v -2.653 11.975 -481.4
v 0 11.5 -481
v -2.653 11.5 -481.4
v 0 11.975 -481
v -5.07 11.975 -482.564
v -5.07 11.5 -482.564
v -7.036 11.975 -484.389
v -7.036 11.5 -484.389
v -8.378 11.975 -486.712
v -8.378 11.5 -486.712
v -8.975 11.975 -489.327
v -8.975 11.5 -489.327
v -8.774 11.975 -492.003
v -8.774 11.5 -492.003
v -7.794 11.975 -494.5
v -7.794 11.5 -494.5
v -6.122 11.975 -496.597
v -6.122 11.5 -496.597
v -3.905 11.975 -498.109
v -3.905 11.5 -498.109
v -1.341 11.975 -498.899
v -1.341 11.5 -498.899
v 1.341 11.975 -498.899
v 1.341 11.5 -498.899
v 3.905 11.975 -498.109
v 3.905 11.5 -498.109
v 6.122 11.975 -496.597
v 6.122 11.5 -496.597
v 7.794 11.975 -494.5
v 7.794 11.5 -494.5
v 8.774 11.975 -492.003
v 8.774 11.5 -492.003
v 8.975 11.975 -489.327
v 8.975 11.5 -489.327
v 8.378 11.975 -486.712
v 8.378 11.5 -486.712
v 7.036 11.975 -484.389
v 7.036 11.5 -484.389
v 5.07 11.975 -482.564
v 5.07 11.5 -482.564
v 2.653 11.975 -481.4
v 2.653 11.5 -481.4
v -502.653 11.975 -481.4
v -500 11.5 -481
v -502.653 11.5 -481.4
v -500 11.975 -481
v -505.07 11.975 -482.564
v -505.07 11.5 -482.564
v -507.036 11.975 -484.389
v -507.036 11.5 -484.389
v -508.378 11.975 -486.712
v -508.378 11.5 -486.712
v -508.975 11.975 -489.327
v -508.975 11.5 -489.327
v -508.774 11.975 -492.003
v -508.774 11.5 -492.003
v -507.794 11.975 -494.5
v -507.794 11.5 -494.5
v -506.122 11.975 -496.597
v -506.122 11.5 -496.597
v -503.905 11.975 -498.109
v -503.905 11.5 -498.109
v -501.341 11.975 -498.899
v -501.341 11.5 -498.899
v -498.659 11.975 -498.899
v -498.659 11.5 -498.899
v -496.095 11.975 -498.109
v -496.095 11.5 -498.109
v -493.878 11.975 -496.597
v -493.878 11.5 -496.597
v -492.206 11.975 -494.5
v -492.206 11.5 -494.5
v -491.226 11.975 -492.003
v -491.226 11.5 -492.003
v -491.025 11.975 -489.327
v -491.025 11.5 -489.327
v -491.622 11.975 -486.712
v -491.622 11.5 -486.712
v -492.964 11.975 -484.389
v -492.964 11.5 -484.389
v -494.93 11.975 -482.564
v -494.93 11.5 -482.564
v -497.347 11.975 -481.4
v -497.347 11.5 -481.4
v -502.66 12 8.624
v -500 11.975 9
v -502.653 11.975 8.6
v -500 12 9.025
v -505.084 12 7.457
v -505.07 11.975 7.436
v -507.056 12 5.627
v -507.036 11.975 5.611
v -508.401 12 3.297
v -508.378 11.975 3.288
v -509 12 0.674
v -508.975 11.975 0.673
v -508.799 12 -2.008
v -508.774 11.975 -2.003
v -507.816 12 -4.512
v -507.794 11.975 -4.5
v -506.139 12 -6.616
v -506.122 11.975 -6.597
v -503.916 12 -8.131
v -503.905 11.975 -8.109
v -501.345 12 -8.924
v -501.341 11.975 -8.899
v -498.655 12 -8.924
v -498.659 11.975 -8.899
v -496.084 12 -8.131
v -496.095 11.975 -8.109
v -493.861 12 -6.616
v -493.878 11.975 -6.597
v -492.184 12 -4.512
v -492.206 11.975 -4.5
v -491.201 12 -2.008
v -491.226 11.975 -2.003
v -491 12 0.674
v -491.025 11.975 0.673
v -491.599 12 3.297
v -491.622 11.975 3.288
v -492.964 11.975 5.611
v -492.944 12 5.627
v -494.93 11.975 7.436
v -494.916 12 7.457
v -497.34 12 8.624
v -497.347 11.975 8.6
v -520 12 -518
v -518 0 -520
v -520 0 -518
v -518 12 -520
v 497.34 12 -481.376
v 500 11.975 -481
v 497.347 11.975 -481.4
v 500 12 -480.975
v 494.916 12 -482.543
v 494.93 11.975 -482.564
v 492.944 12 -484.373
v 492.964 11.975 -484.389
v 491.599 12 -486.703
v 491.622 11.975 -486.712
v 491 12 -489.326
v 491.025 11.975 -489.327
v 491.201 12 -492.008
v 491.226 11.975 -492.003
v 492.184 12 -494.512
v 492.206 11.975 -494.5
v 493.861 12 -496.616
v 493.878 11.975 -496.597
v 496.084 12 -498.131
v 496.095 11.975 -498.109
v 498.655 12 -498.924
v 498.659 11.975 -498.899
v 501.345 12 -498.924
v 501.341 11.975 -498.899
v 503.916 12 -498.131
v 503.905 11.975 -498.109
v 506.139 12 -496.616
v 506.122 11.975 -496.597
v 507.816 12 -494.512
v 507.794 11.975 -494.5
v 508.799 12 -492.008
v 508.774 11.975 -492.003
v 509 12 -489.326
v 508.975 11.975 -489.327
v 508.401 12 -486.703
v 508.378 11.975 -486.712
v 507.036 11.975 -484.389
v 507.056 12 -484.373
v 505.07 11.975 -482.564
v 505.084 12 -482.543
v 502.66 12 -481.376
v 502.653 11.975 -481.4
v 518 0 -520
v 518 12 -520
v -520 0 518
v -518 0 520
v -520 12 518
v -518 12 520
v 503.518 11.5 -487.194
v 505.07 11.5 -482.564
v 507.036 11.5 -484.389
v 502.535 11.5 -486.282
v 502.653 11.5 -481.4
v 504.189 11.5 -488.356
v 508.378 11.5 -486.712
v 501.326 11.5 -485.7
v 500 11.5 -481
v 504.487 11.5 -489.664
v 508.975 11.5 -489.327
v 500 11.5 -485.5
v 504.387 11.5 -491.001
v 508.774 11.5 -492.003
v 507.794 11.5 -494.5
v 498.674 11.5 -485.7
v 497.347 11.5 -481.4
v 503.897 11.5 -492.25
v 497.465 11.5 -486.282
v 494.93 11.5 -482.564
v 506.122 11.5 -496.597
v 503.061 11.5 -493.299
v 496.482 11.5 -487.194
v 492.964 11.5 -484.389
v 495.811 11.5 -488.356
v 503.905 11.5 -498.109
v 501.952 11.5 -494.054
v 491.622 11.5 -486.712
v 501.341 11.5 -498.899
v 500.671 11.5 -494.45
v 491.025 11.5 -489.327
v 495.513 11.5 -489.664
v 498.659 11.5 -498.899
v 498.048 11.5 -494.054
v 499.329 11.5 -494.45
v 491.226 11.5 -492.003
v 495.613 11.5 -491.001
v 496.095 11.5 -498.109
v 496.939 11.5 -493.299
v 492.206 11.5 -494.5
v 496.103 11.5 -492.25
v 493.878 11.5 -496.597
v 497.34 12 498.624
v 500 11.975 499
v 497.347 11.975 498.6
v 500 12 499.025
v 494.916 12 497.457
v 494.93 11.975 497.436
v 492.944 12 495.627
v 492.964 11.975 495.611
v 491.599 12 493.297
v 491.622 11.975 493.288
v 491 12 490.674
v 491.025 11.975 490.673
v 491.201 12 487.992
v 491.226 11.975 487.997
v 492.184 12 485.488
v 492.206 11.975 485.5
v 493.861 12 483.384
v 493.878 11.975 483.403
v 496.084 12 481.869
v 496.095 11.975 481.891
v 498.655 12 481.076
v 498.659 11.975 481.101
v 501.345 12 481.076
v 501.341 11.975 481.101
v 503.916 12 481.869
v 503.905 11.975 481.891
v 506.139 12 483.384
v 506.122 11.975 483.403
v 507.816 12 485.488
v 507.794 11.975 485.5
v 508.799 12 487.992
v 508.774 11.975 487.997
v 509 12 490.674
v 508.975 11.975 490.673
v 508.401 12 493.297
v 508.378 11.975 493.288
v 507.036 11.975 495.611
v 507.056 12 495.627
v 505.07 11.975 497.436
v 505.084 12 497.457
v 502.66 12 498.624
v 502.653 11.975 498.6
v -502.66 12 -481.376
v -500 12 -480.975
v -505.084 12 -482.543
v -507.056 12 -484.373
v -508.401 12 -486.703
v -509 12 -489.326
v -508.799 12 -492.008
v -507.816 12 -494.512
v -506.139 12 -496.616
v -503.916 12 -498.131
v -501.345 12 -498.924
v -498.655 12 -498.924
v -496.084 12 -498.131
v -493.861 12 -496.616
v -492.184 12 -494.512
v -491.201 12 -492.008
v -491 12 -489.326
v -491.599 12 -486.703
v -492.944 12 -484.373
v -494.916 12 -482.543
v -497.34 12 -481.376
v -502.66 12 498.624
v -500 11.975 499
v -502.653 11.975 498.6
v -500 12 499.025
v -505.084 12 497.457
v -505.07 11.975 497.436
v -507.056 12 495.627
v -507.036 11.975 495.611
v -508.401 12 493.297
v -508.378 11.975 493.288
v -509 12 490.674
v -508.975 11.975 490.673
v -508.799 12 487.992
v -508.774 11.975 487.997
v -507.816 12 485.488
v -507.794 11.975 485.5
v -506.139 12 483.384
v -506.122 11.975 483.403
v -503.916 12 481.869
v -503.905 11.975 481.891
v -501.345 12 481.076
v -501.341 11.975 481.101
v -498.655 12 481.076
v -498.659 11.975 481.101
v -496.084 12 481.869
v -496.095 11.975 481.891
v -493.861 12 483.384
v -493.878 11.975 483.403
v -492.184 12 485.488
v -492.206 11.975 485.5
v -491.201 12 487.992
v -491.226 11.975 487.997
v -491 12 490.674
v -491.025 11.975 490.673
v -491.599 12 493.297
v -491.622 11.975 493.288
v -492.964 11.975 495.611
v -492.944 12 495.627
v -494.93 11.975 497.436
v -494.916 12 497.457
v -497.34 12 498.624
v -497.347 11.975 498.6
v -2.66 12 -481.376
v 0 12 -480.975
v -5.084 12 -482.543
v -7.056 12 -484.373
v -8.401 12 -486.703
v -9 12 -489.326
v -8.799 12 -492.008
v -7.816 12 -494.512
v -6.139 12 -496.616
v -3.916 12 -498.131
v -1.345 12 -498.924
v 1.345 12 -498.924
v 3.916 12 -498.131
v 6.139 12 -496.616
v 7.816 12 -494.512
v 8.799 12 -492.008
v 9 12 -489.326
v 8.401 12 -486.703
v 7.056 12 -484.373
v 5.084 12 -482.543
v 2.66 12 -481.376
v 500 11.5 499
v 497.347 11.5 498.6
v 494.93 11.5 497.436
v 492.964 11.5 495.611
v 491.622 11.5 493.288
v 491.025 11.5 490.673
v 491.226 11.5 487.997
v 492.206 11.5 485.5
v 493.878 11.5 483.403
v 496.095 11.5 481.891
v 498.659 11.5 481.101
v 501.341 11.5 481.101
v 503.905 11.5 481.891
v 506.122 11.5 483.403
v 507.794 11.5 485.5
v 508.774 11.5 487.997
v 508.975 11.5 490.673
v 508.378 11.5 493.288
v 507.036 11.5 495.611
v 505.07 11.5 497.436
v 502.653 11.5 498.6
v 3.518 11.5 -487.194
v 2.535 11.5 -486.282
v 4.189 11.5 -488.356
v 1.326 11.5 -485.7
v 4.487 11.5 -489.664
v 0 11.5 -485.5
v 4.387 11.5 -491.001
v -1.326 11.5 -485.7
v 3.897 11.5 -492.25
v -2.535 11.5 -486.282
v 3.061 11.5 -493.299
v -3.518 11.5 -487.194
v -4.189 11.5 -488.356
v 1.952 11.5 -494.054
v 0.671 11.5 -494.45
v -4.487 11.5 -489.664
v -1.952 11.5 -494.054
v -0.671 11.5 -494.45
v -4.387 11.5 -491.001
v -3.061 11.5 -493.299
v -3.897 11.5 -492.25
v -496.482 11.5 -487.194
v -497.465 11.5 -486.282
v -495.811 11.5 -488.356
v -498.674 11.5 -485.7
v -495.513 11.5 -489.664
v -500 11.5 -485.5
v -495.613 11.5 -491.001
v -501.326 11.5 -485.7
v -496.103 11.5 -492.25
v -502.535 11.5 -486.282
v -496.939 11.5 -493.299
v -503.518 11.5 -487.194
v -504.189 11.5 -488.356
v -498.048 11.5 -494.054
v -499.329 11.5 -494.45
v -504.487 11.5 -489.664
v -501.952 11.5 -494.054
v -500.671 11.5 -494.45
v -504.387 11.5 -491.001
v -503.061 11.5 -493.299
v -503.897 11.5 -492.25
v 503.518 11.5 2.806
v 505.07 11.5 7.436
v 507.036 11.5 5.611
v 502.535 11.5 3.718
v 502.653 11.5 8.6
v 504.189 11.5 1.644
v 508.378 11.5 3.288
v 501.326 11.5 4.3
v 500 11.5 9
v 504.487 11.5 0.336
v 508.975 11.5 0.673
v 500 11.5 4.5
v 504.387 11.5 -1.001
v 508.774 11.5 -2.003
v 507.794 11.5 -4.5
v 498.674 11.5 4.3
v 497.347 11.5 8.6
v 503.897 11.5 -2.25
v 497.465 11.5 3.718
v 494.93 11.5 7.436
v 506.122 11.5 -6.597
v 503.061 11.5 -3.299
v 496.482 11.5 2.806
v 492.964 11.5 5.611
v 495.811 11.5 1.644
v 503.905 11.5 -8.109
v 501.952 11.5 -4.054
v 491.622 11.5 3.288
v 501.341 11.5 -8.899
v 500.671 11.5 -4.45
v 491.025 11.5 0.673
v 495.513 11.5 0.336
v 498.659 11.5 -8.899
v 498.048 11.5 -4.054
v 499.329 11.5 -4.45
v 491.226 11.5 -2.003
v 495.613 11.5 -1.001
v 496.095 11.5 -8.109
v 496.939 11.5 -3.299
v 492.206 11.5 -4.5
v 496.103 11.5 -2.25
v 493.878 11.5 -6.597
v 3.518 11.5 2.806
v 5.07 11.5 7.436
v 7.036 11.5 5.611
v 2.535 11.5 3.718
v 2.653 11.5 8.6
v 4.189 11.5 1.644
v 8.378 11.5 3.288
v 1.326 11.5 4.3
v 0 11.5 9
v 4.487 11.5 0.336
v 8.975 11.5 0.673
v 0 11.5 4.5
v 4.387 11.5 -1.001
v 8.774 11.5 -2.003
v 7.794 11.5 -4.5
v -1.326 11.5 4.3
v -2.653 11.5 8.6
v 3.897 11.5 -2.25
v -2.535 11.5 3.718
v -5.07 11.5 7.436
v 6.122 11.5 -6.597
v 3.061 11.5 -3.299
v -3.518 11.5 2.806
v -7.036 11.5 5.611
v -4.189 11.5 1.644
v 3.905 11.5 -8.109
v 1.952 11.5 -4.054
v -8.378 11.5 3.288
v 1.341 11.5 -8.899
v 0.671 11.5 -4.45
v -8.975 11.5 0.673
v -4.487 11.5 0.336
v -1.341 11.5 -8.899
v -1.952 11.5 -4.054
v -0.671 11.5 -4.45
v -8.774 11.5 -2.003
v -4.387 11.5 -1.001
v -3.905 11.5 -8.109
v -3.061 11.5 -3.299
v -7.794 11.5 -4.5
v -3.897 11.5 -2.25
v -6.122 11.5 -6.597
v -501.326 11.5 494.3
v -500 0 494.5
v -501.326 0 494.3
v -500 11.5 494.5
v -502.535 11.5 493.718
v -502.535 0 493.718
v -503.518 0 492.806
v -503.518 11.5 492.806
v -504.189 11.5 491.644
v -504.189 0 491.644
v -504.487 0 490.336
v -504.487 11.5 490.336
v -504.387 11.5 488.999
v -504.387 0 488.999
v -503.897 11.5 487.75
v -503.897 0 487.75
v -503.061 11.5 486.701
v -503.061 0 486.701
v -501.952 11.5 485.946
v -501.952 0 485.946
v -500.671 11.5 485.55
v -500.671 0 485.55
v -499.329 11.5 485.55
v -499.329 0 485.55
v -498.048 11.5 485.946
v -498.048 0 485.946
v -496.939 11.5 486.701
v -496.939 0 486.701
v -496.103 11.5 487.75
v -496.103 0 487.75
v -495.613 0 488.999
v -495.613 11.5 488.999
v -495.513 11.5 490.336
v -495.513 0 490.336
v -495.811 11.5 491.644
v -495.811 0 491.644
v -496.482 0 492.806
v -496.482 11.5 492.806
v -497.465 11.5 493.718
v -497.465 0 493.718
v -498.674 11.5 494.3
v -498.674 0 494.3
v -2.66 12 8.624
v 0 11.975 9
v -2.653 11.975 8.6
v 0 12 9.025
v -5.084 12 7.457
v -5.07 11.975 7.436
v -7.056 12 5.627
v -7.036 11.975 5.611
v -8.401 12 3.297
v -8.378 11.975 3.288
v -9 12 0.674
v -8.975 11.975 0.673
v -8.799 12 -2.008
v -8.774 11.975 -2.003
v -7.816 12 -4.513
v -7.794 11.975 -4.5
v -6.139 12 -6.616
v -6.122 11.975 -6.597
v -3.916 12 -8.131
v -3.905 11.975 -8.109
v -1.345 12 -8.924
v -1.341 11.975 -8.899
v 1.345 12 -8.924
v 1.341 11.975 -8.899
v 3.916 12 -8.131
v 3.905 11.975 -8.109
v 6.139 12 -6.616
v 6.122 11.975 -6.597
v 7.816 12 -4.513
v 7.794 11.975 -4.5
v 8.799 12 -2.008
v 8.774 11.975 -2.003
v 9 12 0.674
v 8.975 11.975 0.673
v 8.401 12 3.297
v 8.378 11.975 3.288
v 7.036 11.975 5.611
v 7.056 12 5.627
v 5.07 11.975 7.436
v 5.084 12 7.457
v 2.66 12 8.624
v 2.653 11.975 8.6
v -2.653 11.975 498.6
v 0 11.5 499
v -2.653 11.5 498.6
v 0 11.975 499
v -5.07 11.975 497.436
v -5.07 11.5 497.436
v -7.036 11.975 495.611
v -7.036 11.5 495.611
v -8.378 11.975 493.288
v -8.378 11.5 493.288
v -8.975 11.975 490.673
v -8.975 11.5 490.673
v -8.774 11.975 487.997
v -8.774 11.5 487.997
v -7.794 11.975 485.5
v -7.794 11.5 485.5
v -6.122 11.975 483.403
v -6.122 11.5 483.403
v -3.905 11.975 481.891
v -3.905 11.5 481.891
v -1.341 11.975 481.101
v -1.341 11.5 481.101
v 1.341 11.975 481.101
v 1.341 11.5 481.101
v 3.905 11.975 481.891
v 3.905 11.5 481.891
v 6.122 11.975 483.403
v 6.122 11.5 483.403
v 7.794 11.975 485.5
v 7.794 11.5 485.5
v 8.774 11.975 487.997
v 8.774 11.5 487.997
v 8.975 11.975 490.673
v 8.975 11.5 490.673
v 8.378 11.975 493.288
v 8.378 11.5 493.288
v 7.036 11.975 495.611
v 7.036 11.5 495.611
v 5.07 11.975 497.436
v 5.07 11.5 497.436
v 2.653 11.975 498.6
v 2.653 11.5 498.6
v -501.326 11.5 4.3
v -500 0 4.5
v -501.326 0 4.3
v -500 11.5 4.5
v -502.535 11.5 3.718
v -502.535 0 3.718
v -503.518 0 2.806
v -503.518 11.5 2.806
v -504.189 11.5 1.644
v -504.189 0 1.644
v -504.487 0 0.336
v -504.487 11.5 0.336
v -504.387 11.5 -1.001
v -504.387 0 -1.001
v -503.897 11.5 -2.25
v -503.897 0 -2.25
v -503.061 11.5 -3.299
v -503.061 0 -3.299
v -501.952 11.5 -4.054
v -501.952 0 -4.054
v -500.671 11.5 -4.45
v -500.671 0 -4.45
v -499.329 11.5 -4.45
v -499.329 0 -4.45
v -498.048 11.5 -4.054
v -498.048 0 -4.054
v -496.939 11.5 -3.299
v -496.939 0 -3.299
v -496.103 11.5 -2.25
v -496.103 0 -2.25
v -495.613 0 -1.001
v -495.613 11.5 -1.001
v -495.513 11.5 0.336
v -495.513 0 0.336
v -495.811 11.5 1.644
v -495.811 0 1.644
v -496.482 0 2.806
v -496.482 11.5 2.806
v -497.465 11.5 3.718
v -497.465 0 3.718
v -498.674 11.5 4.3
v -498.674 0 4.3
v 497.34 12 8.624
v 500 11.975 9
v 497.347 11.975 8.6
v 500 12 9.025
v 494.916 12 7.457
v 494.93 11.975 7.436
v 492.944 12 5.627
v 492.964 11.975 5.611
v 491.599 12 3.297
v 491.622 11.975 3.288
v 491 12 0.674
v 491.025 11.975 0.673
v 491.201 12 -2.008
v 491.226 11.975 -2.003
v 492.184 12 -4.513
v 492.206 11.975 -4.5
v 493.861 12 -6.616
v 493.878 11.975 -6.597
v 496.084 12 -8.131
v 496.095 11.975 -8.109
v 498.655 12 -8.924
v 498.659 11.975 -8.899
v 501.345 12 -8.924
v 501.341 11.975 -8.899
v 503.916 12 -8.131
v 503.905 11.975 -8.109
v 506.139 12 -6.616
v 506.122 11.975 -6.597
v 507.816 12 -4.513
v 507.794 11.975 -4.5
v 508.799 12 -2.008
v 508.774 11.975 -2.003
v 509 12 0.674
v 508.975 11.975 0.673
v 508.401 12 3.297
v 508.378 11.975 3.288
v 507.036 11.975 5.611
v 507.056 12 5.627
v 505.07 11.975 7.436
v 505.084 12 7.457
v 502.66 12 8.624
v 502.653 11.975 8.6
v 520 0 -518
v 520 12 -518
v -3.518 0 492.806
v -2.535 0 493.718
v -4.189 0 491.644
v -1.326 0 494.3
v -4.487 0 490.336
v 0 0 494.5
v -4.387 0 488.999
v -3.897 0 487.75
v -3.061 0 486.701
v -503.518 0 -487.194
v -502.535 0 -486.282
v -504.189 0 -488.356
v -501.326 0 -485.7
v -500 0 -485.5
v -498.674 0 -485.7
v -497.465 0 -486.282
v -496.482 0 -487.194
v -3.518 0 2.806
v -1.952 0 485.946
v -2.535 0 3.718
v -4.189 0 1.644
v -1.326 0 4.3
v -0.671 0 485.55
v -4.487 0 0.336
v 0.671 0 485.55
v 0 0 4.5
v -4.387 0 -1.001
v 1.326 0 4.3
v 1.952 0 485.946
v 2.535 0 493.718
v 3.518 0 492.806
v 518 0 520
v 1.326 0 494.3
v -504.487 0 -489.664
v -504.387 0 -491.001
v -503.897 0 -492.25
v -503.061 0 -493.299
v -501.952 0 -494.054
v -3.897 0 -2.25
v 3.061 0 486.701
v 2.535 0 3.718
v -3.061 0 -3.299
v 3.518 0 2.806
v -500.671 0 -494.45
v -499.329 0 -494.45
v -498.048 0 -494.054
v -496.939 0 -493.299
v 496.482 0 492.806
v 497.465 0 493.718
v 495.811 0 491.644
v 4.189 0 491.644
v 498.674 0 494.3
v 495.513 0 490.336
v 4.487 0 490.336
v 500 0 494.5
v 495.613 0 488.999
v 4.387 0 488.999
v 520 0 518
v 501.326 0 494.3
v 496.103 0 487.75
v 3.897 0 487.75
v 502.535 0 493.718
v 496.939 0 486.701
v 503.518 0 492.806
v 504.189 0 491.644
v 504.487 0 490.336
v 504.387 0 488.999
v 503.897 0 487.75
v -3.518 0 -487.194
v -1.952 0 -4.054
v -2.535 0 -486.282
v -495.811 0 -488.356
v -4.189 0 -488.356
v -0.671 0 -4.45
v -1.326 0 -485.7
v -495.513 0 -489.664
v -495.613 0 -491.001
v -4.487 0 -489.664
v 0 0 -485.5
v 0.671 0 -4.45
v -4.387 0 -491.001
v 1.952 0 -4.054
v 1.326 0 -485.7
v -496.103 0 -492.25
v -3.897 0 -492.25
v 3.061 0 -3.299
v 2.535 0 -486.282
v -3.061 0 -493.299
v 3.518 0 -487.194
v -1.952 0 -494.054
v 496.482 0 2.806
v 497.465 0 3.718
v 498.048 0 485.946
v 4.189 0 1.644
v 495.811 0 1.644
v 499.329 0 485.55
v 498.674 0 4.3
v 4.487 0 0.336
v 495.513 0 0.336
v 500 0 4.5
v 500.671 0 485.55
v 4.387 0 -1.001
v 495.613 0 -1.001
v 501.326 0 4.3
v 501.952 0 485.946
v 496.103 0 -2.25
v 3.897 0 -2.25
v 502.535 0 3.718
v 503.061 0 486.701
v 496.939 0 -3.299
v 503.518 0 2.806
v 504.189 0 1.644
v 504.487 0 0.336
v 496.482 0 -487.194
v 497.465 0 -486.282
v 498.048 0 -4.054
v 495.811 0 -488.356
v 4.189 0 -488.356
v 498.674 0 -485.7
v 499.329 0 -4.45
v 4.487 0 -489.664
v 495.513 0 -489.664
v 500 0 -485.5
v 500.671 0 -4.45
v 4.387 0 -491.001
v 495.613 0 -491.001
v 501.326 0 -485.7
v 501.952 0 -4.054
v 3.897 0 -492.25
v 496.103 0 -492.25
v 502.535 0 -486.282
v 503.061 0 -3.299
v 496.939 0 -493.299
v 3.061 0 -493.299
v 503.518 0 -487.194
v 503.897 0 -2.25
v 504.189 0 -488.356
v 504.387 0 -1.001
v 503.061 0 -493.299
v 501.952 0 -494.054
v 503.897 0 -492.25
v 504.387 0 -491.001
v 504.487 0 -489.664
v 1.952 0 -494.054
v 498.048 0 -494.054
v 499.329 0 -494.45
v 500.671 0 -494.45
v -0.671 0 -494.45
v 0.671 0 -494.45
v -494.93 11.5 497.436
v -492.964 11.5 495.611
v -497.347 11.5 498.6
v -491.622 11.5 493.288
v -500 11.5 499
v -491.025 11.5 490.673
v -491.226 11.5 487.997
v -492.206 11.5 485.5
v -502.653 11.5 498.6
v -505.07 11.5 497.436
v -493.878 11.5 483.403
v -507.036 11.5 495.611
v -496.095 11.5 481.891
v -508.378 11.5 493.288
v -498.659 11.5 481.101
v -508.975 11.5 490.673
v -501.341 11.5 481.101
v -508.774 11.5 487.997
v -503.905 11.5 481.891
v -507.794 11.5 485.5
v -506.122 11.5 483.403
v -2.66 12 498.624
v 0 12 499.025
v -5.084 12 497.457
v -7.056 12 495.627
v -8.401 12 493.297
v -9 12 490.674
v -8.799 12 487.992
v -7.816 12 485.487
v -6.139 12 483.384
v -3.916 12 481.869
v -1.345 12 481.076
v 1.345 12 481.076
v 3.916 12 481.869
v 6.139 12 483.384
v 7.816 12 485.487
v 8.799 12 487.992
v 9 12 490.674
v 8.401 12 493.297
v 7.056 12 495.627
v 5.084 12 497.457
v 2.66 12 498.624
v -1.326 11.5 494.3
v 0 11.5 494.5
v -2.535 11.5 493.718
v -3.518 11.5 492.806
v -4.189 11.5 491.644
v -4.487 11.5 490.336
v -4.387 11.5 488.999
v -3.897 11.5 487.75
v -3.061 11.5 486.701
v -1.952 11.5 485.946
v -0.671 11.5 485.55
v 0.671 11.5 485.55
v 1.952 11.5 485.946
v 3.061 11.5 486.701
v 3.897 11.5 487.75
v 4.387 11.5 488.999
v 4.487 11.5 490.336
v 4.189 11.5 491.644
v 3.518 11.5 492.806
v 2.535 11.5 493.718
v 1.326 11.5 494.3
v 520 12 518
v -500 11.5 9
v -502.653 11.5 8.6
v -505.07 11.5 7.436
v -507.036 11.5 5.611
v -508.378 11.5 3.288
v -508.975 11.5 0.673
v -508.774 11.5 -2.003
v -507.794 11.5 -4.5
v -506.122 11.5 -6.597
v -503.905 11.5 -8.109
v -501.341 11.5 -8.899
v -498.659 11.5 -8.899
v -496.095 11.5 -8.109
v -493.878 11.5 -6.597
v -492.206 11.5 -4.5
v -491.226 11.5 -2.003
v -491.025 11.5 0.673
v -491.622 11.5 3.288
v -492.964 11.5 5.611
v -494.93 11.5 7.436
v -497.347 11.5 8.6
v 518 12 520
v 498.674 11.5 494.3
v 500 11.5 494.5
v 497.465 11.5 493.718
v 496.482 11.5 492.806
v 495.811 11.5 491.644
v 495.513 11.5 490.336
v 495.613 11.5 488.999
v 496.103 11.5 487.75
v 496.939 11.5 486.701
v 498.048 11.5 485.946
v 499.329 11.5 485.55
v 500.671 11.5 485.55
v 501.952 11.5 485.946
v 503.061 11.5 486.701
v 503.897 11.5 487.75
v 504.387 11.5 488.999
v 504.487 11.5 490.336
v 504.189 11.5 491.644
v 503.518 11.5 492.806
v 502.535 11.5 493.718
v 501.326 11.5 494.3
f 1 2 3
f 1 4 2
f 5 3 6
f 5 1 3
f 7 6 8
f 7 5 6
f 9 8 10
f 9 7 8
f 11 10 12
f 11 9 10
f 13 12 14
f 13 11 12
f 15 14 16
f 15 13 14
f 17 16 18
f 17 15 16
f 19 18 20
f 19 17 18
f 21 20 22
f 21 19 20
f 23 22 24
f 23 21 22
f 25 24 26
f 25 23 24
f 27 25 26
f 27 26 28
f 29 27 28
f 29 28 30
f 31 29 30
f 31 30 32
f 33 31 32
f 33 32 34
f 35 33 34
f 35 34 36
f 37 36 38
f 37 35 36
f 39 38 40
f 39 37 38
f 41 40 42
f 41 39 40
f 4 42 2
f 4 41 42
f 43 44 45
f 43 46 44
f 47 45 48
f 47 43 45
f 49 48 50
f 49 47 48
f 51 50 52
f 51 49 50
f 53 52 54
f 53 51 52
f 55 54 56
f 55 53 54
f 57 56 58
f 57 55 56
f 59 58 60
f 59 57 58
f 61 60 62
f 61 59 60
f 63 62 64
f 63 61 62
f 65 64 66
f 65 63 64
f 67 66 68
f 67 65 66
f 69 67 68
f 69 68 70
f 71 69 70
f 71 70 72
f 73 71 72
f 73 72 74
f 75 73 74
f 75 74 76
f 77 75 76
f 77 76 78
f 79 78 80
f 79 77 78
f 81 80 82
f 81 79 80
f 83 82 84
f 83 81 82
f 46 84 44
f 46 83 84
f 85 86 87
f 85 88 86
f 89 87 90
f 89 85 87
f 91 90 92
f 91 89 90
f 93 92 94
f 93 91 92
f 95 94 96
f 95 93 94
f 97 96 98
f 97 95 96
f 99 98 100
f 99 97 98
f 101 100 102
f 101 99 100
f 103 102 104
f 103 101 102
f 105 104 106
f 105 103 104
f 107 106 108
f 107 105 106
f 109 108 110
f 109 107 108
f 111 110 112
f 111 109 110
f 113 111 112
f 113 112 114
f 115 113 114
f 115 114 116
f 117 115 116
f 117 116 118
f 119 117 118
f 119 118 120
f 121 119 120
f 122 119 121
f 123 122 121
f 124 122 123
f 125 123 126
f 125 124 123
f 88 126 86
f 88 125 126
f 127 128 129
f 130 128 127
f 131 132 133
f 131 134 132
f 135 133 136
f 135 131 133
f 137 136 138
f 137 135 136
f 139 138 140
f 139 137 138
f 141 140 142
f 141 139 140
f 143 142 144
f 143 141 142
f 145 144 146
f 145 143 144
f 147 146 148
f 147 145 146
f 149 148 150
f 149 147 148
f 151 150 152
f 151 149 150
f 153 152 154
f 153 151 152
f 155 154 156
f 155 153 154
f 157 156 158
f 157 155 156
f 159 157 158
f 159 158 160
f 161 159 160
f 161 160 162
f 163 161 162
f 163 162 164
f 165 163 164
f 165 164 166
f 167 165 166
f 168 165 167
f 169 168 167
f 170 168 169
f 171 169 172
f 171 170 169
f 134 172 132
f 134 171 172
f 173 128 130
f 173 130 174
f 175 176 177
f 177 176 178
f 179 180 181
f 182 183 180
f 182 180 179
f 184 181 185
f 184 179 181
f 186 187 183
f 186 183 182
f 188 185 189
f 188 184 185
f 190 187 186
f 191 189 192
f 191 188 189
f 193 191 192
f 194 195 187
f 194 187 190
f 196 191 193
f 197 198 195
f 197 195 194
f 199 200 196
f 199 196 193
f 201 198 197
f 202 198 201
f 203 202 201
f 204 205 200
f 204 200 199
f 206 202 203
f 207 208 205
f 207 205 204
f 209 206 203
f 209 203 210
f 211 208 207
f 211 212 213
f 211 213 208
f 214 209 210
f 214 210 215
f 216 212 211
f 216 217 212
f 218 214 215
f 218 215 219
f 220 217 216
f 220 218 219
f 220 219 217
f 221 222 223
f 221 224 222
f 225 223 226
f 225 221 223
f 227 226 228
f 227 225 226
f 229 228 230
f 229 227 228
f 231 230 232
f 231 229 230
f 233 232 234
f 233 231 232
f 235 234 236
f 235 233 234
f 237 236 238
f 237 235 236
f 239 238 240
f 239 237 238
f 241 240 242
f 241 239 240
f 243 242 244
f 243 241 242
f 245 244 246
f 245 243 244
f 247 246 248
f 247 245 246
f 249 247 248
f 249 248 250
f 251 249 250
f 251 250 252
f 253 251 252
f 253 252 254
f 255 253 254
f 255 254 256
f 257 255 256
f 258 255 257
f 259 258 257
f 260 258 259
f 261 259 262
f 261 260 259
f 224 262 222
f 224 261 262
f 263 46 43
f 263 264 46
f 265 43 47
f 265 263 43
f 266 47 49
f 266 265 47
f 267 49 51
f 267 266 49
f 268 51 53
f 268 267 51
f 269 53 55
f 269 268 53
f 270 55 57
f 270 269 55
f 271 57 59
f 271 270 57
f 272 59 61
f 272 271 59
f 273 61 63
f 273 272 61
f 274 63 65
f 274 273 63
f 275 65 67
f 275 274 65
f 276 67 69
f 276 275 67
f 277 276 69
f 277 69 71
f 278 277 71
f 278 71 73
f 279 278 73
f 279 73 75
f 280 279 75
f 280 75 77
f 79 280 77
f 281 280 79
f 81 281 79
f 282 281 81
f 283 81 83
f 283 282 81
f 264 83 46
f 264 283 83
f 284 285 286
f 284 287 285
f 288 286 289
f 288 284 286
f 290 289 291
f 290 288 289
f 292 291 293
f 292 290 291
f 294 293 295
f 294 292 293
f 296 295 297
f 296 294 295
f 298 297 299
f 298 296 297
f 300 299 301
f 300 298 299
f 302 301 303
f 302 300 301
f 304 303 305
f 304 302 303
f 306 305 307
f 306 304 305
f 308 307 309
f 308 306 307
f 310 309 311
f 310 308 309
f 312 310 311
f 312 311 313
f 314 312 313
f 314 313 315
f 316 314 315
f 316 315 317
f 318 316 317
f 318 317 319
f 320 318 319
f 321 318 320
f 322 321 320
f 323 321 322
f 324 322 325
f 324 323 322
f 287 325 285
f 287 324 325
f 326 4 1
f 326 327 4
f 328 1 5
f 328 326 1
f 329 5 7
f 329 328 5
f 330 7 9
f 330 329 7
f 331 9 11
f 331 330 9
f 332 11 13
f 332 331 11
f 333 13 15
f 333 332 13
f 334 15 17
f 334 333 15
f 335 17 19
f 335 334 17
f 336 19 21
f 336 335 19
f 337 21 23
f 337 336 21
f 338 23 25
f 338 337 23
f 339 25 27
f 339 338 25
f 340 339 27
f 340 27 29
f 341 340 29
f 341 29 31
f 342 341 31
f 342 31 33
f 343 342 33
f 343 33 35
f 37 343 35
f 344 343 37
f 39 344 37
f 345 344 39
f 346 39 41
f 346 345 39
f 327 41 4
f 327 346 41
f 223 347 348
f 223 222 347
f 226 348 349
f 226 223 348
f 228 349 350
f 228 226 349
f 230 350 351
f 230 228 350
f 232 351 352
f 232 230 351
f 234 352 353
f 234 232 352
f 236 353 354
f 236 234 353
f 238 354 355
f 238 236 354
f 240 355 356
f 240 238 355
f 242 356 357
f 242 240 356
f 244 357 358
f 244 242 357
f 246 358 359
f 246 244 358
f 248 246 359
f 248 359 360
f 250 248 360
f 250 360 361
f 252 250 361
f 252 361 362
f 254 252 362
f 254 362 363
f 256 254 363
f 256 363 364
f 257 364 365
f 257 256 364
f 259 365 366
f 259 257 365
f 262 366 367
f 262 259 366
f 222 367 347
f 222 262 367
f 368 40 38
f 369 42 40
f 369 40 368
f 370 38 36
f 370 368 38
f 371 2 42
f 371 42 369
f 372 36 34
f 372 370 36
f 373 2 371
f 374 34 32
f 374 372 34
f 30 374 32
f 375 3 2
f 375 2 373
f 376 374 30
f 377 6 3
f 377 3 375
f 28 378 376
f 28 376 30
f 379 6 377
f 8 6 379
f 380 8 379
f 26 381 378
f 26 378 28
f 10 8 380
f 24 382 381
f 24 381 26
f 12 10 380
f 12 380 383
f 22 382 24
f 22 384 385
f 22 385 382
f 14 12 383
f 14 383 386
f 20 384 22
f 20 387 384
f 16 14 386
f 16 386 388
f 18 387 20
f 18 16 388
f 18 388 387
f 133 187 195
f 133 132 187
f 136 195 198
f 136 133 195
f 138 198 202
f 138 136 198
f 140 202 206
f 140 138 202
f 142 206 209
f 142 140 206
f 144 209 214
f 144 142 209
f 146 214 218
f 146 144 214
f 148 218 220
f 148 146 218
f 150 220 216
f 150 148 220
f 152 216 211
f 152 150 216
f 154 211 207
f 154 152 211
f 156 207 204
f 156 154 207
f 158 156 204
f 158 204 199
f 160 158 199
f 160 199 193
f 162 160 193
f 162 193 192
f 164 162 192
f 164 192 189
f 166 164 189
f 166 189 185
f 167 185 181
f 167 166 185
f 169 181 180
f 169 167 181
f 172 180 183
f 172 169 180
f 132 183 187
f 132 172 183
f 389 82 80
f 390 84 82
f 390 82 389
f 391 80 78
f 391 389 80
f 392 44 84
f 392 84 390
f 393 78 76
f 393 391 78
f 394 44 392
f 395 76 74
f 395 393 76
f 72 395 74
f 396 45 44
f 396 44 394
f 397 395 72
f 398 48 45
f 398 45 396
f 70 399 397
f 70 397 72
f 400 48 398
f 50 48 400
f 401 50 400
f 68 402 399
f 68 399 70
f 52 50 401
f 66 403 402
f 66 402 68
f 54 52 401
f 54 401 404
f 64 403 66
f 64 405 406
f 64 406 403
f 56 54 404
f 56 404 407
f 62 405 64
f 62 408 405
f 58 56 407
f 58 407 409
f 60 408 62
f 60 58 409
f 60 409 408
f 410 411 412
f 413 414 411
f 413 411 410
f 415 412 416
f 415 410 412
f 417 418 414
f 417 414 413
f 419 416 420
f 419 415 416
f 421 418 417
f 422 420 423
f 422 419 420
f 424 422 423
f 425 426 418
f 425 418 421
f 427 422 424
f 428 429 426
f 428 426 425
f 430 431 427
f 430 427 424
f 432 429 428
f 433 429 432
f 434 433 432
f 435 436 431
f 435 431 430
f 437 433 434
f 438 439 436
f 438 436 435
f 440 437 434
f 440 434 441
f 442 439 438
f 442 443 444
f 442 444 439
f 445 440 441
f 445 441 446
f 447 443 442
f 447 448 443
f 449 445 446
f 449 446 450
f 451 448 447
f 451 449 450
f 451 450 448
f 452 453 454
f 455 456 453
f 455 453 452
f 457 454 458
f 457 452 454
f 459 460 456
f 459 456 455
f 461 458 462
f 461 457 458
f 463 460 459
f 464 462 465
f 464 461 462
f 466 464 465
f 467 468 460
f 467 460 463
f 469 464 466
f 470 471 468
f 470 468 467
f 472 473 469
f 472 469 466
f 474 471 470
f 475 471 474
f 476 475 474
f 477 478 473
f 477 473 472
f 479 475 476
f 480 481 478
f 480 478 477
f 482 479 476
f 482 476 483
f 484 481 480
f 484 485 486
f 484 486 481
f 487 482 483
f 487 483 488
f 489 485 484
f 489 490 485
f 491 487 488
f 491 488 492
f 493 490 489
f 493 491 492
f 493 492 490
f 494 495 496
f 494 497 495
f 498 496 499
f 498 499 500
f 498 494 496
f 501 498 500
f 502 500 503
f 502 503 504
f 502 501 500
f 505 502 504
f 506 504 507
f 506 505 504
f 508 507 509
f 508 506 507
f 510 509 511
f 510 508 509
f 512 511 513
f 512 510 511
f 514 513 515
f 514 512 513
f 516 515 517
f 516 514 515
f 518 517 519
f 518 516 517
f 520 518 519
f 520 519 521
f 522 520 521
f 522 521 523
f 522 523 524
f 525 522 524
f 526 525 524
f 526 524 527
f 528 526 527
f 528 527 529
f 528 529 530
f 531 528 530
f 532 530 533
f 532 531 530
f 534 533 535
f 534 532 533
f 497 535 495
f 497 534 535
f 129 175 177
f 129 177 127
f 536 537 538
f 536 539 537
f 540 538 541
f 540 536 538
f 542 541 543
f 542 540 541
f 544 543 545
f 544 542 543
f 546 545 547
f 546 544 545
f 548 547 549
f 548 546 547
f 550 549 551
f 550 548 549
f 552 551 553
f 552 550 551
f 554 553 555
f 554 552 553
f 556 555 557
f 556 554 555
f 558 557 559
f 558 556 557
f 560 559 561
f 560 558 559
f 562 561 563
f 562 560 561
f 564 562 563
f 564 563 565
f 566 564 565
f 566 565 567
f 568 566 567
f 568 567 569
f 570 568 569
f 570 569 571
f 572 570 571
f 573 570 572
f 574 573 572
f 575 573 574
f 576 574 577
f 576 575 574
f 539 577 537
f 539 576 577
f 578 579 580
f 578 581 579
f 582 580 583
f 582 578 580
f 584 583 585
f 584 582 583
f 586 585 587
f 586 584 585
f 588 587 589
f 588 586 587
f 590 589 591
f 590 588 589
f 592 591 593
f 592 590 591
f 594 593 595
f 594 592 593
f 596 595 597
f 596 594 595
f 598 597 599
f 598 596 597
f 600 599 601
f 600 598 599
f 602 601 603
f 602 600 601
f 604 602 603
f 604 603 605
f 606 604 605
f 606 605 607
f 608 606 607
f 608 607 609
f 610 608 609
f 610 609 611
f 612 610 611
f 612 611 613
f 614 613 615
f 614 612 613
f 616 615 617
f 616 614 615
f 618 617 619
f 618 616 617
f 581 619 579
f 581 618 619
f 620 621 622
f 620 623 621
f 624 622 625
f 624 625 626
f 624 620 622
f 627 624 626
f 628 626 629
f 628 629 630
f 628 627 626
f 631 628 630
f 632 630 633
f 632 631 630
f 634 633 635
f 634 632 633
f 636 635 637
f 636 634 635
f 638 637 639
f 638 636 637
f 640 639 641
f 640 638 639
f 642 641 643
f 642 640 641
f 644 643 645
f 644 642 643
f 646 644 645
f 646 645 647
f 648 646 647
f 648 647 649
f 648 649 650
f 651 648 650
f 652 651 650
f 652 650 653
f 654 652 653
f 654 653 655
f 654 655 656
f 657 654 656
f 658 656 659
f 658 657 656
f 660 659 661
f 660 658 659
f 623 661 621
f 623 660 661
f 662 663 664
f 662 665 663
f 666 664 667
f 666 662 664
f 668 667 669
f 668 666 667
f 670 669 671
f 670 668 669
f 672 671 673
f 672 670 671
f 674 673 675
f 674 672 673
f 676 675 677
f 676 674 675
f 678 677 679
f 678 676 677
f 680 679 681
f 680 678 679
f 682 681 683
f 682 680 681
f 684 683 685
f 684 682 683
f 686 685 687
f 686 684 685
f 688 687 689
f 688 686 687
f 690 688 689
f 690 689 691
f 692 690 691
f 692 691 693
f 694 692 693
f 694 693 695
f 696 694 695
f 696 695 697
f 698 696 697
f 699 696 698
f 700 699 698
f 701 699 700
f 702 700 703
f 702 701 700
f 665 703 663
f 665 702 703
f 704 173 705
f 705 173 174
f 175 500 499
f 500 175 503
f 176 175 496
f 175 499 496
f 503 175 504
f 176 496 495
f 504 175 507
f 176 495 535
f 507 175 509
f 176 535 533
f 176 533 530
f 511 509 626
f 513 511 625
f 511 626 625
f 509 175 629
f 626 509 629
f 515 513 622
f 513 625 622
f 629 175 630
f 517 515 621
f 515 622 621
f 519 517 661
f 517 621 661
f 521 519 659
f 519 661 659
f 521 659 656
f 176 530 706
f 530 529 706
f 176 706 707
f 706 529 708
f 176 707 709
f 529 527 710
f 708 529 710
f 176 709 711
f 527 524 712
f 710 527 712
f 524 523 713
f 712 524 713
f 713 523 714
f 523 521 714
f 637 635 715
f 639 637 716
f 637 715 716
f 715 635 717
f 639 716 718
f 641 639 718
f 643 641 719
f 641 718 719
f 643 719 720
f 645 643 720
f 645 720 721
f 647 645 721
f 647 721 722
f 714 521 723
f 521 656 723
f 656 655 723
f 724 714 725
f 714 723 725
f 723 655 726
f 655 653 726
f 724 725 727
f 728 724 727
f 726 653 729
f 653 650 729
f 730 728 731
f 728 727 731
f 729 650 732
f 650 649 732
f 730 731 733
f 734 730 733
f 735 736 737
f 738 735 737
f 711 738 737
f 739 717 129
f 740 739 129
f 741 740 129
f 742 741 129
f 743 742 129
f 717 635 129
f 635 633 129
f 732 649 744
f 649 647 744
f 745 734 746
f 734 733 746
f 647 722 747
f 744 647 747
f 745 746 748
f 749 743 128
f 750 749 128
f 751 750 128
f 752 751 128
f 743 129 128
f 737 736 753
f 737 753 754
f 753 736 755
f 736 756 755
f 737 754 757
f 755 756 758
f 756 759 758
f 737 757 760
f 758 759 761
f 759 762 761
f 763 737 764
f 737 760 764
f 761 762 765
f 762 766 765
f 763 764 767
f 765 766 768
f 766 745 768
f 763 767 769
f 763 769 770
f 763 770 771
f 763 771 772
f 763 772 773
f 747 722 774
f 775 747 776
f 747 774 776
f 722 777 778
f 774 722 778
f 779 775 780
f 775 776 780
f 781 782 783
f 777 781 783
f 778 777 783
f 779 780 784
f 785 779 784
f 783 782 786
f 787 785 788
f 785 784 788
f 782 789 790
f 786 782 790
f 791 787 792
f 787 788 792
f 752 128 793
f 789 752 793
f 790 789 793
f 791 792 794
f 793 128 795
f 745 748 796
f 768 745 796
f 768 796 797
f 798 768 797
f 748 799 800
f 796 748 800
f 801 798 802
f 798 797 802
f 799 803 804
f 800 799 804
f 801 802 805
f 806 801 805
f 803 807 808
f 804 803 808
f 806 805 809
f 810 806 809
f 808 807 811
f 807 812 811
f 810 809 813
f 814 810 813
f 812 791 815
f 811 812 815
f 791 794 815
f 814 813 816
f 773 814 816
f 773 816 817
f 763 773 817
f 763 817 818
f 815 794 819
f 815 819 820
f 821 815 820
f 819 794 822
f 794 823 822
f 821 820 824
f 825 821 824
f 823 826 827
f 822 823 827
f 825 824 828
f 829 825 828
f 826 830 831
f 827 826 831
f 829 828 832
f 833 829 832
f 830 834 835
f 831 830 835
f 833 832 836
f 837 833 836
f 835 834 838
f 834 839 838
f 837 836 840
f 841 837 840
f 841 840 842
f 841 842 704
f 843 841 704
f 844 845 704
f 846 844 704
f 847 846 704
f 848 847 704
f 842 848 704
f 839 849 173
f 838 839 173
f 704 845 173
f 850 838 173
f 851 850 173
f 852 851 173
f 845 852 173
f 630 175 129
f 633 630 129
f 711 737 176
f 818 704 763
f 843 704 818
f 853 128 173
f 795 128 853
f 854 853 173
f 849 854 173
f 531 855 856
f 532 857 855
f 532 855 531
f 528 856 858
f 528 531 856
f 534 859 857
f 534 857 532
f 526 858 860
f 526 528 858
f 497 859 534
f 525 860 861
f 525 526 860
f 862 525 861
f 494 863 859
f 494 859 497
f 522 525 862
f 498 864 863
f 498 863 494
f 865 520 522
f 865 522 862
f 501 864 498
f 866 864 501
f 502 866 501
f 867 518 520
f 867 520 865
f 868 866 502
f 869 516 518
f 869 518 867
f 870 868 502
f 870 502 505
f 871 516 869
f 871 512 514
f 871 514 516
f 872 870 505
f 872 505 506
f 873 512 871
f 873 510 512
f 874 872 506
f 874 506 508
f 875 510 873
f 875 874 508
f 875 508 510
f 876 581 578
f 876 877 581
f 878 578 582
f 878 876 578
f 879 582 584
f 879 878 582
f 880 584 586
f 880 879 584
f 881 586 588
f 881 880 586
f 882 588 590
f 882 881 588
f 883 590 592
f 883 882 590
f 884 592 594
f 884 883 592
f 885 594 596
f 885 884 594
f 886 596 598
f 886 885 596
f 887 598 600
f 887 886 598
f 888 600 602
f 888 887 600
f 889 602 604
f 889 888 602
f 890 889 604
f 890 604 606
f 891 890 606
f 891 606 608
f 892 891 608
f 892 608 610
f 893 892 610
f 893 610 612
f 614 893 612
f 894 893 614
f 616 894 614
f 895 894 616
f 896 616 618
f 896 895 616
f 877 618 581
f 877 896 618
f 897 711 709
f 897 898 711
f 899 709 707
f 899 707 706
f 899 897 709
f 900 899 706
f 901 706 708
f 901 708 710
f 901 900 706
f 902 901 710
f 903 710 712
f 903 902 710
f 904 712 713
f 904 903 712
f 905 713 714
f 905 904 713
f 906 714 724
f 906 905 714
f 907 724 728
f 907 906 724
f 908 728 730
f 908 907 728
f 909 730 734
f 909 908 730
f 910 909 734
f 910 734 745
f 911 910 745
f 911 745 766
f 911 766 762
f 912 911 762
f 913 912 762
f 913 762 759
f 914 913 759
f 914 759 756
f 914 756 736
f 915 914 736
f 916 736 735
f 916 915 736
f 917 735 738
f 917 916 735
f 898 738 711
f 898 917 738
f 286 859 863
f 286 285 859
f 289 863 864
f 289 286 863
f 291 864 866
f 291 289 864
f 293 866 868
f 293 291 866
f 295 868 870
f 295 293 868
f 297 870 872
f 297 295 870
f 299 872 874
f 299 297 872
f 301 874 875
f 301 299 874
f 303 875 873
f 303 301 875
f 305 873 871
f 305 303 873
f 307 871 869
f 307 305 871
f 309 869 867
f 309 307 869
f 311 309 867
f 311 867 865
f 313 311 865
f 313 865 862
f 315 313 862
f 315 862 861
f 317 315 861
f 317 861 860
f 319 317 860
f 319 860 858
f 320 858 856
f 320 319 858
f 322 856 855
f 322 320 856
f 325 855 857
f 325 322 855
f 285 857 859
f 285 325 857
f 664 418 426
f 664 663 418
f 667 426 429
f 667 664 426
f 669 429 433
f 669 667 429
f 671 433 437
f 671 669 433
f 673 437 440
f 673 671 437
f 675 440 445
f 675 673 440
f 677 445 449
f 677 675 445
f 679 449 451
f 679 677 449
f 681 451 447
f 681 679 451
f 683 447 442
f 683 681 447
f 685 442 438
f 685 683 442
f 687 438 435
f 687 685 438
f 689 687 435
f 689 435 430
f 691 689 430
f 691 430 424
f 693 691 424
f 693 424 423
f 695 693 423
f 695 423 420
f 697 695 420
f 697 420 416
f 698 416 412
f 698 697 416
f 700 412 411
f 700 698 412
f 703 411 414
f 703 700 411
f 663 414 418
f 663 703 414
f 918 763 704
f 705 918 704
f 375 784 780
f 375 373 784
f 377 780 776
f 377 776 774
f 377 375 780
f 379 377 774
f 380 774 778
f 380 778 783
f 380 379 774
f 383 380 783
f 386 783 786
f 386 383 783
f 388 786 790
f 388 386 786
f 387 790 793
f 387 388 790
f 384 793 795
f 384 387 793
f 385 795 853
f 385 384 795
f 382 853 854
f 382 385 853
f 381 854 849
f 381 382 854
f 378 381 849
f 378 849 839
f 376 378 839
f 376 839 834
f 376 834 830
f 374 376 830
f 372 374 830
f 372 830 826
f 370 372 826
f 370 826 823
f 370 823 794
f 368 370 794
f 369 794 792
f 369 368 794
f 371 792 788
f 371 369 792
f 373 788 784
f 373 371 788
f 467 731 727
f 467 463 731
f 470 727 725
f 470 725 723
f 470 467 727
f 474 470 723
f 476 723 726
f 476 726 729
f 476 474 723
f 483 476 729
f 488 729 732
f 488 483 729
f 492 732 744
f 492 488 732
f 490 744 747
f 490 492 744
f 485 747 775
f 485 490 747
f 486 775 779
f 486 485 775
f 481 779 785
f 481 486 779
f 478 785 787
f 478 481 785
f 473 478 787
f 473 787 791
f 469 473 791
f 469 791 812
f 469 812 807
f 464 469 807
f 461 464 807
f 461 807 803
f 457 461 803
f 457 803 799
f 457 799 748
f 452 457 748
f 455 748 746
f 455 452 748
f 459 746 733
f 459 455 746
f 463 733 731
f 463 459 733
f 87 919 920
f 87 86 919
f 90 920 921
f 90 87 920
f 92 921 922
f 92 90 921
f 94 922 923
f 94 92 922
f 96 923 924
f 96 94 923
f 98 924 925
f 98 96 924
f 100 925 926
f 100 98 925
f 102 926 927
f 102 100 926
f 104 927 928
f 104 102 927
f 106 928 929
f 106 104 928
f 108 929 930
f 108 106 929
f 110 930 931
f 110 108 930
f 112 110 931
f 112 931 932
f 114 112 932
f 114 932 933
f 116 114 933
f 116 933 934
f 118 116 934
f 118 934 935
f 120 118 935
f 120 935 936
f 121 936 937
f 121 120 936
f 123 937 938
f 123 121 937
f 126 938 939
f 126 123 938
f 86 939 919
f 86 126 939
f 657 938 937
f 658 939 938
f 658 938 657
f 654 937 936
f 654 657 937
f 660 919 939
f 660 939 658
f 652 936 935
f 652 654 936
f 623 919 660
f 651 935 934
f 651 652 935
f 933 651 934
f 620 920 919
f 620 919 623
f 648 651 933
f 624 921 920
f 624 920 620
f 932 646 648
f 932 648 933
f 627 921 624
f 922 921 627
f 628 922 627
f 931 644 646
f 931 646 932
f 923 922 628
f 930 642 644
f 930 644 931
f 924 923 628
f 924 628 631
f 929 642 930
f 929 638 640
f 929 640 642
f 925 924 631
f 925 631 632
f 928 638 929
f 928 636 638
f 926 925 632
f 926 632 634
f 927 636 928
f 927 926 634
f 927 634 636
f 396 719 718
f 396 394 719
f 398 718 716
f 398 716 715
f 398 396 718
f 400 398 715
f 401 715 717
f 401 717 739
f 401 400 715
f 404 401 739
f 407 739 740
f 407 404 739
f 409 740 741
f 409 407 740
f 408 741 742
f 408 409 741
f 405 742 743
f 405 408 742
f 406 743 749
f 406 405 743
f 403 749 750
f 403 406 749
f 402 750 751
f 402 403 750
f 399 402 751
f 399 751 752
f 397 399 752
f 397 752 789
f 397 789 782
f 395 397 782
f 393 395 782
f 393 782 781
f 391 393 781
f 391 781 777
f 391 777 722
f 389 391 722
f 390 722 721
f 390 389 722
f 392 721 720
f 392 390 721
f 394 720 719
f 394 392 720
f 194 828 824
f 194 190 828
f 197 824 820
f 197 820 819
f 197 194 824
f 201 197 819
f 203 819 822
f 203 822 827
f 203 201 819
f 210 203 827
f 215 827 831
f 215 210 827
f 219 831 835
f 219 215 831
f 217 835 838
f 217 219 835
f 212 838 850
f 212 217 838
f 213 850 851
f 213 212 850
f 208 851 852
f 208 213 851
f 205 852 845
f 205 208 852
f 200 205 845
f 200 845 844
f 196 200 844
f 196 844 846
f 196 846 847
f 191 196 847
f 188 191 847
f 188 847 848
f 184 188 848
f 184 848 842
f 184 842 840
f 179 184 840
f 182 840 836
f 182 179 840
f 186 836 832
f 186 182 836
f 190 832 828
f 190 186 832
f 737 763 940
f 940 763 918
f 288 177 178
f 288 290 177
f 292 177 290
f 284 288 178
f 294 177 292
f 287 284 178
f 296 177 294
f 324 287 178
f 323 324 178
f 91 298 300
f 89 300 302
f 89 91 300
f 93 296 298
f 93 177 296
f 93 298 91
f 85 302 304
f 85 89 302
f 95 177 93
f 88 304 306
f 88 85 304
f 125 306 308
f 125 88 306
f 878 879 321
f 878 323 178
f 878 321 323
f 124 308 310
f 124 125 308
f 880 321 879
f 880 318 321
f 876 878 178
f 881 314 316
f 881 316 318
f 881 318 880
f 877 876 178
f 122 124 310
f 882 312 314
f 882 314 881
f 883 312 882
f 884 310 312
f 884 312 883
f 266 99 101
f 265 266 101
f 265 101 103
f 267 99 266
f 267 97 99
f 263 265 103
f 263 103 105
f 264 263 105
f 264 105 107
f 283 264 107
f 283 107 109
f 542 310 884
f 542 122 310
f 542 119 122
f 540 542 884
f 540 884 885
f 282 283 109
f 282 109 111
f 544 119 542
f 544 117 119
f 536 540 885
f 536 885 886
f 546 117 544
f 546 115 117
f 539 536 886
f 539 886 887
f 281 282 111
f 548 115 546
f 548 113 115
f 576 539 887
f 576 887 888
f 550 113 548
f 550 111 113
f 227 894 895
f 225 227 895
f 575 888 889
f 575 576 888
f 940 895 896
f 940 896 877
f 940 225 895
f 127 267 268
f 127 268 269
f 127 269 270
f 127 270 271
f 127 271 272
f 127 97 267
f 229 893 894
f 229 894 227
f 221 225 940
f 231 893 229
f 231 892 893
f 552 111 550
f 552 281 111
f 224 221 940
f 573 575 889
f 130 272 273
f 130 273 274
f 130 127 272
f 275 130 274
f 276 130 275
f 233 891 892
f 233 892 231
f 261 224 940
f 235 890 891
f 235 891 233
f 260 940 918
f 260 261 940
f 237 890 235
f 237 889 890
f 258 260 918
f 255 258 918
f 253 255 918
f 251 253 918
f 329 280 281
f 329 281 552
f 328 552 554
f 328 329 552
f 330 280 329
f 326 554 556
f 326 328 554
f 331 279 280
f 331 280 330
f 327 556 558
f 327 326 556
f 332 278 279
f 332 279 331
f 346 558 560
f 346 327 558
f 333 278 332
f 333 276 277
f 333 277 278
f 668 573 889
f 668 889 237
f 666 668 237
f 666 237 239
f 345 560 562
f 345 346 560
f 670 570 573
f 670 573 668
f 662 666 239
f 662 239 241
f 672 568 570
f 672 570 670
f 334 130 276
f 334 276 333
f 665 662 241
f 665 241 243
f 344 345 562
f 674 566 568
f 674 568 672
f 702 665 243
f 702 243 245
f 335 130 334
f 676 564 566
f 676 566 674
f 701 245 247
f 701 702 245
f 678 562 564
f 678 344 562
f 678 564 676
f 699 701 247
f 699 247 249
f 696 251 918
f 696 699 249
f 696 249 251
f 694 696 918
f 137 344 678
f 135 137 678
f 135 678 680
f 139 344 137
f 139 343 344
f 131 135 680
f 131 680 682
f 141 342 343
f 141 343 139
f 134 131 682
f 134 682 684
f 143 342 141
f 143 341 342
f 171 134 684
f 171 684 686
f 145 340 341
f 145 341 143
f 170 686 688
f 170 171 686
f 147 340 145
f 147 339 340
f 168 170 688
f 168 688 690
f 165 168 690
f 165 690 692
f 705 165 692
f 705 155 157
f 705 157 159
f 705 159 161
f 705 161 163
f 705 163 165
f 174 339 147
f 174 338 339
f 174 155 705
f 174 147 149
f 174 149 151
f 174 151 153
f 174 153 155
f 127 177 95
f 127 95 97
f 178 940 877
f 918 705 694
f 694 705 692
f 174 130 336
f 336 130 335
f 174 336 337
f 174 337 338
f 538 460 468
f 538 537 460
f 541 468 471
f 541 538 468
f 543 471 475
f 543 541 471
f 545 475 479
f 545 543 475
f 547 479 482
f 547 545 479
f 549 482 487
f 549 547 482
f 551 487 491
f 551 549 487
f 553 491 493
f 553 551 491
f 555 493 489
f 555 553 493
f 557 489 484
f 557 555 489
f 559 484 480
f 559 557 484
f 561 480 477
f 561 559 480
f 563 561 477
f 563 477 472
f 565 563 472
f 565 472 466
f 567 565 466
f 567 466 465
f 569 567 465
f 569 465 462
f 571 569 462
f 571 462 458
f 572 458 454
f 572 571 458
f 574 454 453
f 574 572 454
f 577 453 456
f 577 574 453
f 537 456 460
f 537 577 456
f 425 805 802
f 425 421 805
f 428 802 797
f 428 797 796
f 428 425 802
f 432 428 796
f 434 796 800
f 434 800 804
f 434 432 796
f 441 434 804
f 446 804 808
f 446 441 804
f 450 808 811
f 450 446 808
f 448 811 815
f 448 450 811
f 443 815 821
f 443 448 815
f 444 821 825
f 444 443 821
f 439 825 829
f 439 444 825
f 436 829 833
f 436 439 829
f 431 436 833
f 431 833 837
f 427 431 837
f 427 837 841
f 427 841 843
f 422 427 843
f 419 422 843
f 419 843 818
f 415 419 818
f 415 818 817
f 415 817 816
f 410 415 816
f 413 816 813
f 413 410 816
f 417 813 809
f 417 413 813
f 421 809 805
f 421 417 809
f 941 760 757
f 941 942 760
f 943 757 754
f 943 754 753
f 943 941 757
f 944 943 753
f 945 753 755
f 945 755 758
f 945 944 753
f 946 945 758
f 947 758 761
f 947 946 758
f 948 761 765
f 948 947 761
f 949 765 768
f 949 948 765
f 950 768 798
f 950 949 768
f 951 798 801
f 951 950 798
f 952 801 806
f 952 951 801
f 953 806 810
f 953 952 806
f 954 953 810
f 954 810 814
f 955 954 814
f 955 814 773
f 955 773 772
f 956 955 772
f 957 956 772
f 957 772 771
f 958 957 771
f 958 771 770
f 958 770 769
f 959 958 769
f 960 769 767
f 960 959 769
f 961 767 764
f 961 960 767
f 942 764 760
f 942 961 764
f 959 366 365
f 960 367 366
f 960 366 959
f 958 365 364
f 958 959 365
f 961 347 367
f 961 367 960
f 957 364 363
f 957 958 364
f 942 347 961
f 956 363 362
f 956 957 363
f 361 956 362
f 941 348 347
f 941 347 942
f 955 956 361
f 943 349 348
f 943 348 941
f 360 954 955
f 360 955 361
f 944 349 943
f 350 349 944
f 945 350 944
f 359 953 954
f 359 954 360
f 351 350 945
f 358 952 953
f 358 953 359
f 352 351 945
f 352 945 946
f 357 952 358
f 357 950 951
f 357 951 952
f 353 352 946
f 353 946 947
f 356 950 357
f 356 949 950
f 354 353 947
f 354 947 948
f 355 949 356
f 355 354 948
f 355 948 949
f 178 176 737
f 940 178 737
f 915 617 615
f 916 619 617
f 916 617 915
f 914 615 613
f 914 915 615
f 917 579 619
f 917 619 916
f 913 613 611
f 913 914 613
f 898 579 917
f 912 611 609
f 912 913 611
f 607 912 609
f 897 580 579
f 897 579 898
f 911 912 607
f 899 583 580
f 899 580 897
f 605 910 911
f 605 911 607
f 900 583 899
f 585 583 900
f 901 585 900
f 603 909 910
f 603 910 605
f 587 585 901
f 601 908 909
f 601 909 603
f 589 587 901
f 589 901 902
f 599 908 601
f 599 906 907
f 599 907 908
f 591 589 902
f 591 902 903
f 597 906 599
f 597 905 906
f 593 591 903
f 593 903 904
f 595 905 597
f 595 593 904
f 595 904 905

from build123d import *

# Parameters (mm, degrees)
SKETCH_1_W                  = 1040
SKETCH_1_H                  = 1040
EXTRUDE_1_DEPTH             = 12
CHAMFER_1_SIZE              = 2
HOLE_WIZARD_M8_1_AT_2_COUNT = 2
HOLE_WIZARD_M8_1_AT_2_PITCH = 500
HOLE_WIZARD_M8_1_AT_3_COUNT = 2
HOLE_WIZARD_M8_1_AT_3_PITCH = 1000
HOLE_WIZARD_M8_1_AT_4_COUNT = 2
HOLE_WIZARD_M8_1_AT_4_PITCH = 490
HOLE_WIZARD_M8_1_AT_5_COUNT = 2
HOLE_WIZARD_M8_1_AT_5_PITCH = 700.071424927
HOLE_WIZARD_M8_1_AT_6_COUNT = 2
HOLE_WIZARD_M8_1_AT_6_PITCH = 1113.597772986
HOLE_WIZARD_M8_1_AT_7_COUNT = 2
HOLE_WIZARD_M8_1_AT_7_PITCH = 980
HOLE_WIZARD_M8_1_AT_8_COUNT = 2
HOLE_WIZARD_M8_1_AT_8_PITCH = 1100.181803158
HOLE_WIZARD_M8_1_AT_9_COUNT = 2
HOLE_WIZARD_M8_1_AT_9_PITCH = 1400.142849855


with BuildPart() as part:
    # 草图1 → 凸台-拉伸1 (new body)
    with BuildSketch(Plane(origin=(0, 0, 0), x_dir=(1, 0, 0), z_dir=(0, 1, 0))):
        Rectangle(SKETCH_1_W, SKETCH_1_H)
    extrude(amount=EXTRUDE_1_DEPTH)

    # 倒角1
    chamfer_1_edges = [part.edges().sort_by_distance(p)[0] for p in [
        (520, 6, 520),
        (-520, 6, 520),
        (-520, 6, -520),
        (520, 6, -520),
    ]]
    chamfer(chamfer_1_edges, length=CHAMFER_1_SIZE)

    # 草图3 → M8 六角头螺栓的柱形沉头孔1 (revolve, cut)
    with BuildSketch(Plane(origin=(-500, 12, -490), x_dir=(0, 0, 1), z_dir=(1, 0, 0))):
        Polygon((0, 0), (0, 12), (4.5, 12), (4.5, 0.5), (9, 0.5), (9, 0.025), (9.025, 0), align=None)
    hole_wizard_m8_1 = revolve(axis=Axis((-500, 18.35, -490), (0, -1, 0)), mode=Mode.SUBTRACT)

    # M8 六角头螺栓的柱形沉头孔1 at 2: M8 六角头螺栓的柱形沉头孔1 ×2
    with Locations(*[(i * HOLE_WIZARD_M8_1_AT_2_PITCH, 0, 0) for i in range(1, HOLE_WIZARD_M8_1_AT_2_COUNT)]):
        add(hole_wizard_m8_1, mode=Mode.SUBTRACT)

    # M8 六角头螺栓的柱形沉头孔1 at 3: M8 六角头螺栓的柱形沉头孔1 ×2
    with Locations(*[(i * HOLE_WIZARD_M8_1_AT_3_PITCH, 0, 0) for i in range(1, HOLE_WIZARD_M8_1_AT_3_COUNT)]):
        add(hole_wizard_m8_1, mode=Mode.SUBTRACT)

    # M8 六角头螺栓的柱形沉头孔1 at 4: M8 六角头螺栓的柱形沉头孔1 ×2
    with Locations(*[(0, 0, i * HOLE_WIZARD_M8_1_AT_4_PITCH) for i in range(1, HOLE_WIZARD_M8_1_AT_4_COUNT)]):
        add(hole_wizard_m8_1, mode=Mode.SUBTRACT)

    # M8 六角头螺栓的柱形沉头孔1 at 5: M8 六角头螺栓的柱形沉头孔1 ×2
    with Locations(*[Vector(0.7142128391425069, 0, 0.6999285823596574) * (i * HOLE_WIZARD_M8_1_AT_5_PITCH) for i in range(1, HOLE_WIZARD_M8_1_AT_5_COUNT)]):
        add(hole_wizard_m8_1, mode=Mode.SUBTRACT)

    # M8 六角头螺栓的柱形沉头孔1 at 6: M8 六角头螺栓的柱形沉头孔1 ×2
    with Locations(*[Vector(0.8979903015775171, 0, 0.44001524777298334) * (i * HOLE_WIZARD_M8_1_AT_6_PITCH) for i in range(1, HOLE_WIZARD_M8_1_AT_6_COUNT)]):
        add(hole_wizard_m8_1, mode=Mode.SUBTRACT)

    # M8 六角头螺栓的柱形沉头孔1 at 7: M8 六角头螺栓的柱形沉头孔1 ×2
    with Locations(*[(0, 0, i * HOLE_WIZARD_M8_1_AT_7_PITCH) for i in range(1, HOLE_WIZARD_M8_1_AT_7_COUNT)]):
        add(hole_wizard_m8_1, mode=Mode.SUBTRACT)

    # M8 六角头螺栓的柱形沉头孔1 at 8: M8 六角头螺栓的柱形沉头孔1 ×2
    with Locations(*[Vector(0.4544703416878743, 0, 0.8907618697082328) * (i * HOLE_WIZARD_M8_1_AT_8_PITCH) for i in range(1, HOLE_WIZARD_M8_1_AT_8_COUNT)]):
        add(hole_wizard_m8_1, mode=Mode.SUBTRACT)

    # M8 六角头螺栓的柱形沉头孔1 at 9: M8 六角头螺栓的柱形沉头孔1 ×2
    with Locations(*[Vector(0.7142128391425073, 0, 0.6999285823596569) * (i * HOLE_WIZARD_M8_1_AT_9_PITCH) for i in range(1, HOLE_WIZARD_M8_1_AT_9_COUNT)]):
        add(hole_wizard_m8_1, mode=Mode.SUBTRACT)


solid = part.part
